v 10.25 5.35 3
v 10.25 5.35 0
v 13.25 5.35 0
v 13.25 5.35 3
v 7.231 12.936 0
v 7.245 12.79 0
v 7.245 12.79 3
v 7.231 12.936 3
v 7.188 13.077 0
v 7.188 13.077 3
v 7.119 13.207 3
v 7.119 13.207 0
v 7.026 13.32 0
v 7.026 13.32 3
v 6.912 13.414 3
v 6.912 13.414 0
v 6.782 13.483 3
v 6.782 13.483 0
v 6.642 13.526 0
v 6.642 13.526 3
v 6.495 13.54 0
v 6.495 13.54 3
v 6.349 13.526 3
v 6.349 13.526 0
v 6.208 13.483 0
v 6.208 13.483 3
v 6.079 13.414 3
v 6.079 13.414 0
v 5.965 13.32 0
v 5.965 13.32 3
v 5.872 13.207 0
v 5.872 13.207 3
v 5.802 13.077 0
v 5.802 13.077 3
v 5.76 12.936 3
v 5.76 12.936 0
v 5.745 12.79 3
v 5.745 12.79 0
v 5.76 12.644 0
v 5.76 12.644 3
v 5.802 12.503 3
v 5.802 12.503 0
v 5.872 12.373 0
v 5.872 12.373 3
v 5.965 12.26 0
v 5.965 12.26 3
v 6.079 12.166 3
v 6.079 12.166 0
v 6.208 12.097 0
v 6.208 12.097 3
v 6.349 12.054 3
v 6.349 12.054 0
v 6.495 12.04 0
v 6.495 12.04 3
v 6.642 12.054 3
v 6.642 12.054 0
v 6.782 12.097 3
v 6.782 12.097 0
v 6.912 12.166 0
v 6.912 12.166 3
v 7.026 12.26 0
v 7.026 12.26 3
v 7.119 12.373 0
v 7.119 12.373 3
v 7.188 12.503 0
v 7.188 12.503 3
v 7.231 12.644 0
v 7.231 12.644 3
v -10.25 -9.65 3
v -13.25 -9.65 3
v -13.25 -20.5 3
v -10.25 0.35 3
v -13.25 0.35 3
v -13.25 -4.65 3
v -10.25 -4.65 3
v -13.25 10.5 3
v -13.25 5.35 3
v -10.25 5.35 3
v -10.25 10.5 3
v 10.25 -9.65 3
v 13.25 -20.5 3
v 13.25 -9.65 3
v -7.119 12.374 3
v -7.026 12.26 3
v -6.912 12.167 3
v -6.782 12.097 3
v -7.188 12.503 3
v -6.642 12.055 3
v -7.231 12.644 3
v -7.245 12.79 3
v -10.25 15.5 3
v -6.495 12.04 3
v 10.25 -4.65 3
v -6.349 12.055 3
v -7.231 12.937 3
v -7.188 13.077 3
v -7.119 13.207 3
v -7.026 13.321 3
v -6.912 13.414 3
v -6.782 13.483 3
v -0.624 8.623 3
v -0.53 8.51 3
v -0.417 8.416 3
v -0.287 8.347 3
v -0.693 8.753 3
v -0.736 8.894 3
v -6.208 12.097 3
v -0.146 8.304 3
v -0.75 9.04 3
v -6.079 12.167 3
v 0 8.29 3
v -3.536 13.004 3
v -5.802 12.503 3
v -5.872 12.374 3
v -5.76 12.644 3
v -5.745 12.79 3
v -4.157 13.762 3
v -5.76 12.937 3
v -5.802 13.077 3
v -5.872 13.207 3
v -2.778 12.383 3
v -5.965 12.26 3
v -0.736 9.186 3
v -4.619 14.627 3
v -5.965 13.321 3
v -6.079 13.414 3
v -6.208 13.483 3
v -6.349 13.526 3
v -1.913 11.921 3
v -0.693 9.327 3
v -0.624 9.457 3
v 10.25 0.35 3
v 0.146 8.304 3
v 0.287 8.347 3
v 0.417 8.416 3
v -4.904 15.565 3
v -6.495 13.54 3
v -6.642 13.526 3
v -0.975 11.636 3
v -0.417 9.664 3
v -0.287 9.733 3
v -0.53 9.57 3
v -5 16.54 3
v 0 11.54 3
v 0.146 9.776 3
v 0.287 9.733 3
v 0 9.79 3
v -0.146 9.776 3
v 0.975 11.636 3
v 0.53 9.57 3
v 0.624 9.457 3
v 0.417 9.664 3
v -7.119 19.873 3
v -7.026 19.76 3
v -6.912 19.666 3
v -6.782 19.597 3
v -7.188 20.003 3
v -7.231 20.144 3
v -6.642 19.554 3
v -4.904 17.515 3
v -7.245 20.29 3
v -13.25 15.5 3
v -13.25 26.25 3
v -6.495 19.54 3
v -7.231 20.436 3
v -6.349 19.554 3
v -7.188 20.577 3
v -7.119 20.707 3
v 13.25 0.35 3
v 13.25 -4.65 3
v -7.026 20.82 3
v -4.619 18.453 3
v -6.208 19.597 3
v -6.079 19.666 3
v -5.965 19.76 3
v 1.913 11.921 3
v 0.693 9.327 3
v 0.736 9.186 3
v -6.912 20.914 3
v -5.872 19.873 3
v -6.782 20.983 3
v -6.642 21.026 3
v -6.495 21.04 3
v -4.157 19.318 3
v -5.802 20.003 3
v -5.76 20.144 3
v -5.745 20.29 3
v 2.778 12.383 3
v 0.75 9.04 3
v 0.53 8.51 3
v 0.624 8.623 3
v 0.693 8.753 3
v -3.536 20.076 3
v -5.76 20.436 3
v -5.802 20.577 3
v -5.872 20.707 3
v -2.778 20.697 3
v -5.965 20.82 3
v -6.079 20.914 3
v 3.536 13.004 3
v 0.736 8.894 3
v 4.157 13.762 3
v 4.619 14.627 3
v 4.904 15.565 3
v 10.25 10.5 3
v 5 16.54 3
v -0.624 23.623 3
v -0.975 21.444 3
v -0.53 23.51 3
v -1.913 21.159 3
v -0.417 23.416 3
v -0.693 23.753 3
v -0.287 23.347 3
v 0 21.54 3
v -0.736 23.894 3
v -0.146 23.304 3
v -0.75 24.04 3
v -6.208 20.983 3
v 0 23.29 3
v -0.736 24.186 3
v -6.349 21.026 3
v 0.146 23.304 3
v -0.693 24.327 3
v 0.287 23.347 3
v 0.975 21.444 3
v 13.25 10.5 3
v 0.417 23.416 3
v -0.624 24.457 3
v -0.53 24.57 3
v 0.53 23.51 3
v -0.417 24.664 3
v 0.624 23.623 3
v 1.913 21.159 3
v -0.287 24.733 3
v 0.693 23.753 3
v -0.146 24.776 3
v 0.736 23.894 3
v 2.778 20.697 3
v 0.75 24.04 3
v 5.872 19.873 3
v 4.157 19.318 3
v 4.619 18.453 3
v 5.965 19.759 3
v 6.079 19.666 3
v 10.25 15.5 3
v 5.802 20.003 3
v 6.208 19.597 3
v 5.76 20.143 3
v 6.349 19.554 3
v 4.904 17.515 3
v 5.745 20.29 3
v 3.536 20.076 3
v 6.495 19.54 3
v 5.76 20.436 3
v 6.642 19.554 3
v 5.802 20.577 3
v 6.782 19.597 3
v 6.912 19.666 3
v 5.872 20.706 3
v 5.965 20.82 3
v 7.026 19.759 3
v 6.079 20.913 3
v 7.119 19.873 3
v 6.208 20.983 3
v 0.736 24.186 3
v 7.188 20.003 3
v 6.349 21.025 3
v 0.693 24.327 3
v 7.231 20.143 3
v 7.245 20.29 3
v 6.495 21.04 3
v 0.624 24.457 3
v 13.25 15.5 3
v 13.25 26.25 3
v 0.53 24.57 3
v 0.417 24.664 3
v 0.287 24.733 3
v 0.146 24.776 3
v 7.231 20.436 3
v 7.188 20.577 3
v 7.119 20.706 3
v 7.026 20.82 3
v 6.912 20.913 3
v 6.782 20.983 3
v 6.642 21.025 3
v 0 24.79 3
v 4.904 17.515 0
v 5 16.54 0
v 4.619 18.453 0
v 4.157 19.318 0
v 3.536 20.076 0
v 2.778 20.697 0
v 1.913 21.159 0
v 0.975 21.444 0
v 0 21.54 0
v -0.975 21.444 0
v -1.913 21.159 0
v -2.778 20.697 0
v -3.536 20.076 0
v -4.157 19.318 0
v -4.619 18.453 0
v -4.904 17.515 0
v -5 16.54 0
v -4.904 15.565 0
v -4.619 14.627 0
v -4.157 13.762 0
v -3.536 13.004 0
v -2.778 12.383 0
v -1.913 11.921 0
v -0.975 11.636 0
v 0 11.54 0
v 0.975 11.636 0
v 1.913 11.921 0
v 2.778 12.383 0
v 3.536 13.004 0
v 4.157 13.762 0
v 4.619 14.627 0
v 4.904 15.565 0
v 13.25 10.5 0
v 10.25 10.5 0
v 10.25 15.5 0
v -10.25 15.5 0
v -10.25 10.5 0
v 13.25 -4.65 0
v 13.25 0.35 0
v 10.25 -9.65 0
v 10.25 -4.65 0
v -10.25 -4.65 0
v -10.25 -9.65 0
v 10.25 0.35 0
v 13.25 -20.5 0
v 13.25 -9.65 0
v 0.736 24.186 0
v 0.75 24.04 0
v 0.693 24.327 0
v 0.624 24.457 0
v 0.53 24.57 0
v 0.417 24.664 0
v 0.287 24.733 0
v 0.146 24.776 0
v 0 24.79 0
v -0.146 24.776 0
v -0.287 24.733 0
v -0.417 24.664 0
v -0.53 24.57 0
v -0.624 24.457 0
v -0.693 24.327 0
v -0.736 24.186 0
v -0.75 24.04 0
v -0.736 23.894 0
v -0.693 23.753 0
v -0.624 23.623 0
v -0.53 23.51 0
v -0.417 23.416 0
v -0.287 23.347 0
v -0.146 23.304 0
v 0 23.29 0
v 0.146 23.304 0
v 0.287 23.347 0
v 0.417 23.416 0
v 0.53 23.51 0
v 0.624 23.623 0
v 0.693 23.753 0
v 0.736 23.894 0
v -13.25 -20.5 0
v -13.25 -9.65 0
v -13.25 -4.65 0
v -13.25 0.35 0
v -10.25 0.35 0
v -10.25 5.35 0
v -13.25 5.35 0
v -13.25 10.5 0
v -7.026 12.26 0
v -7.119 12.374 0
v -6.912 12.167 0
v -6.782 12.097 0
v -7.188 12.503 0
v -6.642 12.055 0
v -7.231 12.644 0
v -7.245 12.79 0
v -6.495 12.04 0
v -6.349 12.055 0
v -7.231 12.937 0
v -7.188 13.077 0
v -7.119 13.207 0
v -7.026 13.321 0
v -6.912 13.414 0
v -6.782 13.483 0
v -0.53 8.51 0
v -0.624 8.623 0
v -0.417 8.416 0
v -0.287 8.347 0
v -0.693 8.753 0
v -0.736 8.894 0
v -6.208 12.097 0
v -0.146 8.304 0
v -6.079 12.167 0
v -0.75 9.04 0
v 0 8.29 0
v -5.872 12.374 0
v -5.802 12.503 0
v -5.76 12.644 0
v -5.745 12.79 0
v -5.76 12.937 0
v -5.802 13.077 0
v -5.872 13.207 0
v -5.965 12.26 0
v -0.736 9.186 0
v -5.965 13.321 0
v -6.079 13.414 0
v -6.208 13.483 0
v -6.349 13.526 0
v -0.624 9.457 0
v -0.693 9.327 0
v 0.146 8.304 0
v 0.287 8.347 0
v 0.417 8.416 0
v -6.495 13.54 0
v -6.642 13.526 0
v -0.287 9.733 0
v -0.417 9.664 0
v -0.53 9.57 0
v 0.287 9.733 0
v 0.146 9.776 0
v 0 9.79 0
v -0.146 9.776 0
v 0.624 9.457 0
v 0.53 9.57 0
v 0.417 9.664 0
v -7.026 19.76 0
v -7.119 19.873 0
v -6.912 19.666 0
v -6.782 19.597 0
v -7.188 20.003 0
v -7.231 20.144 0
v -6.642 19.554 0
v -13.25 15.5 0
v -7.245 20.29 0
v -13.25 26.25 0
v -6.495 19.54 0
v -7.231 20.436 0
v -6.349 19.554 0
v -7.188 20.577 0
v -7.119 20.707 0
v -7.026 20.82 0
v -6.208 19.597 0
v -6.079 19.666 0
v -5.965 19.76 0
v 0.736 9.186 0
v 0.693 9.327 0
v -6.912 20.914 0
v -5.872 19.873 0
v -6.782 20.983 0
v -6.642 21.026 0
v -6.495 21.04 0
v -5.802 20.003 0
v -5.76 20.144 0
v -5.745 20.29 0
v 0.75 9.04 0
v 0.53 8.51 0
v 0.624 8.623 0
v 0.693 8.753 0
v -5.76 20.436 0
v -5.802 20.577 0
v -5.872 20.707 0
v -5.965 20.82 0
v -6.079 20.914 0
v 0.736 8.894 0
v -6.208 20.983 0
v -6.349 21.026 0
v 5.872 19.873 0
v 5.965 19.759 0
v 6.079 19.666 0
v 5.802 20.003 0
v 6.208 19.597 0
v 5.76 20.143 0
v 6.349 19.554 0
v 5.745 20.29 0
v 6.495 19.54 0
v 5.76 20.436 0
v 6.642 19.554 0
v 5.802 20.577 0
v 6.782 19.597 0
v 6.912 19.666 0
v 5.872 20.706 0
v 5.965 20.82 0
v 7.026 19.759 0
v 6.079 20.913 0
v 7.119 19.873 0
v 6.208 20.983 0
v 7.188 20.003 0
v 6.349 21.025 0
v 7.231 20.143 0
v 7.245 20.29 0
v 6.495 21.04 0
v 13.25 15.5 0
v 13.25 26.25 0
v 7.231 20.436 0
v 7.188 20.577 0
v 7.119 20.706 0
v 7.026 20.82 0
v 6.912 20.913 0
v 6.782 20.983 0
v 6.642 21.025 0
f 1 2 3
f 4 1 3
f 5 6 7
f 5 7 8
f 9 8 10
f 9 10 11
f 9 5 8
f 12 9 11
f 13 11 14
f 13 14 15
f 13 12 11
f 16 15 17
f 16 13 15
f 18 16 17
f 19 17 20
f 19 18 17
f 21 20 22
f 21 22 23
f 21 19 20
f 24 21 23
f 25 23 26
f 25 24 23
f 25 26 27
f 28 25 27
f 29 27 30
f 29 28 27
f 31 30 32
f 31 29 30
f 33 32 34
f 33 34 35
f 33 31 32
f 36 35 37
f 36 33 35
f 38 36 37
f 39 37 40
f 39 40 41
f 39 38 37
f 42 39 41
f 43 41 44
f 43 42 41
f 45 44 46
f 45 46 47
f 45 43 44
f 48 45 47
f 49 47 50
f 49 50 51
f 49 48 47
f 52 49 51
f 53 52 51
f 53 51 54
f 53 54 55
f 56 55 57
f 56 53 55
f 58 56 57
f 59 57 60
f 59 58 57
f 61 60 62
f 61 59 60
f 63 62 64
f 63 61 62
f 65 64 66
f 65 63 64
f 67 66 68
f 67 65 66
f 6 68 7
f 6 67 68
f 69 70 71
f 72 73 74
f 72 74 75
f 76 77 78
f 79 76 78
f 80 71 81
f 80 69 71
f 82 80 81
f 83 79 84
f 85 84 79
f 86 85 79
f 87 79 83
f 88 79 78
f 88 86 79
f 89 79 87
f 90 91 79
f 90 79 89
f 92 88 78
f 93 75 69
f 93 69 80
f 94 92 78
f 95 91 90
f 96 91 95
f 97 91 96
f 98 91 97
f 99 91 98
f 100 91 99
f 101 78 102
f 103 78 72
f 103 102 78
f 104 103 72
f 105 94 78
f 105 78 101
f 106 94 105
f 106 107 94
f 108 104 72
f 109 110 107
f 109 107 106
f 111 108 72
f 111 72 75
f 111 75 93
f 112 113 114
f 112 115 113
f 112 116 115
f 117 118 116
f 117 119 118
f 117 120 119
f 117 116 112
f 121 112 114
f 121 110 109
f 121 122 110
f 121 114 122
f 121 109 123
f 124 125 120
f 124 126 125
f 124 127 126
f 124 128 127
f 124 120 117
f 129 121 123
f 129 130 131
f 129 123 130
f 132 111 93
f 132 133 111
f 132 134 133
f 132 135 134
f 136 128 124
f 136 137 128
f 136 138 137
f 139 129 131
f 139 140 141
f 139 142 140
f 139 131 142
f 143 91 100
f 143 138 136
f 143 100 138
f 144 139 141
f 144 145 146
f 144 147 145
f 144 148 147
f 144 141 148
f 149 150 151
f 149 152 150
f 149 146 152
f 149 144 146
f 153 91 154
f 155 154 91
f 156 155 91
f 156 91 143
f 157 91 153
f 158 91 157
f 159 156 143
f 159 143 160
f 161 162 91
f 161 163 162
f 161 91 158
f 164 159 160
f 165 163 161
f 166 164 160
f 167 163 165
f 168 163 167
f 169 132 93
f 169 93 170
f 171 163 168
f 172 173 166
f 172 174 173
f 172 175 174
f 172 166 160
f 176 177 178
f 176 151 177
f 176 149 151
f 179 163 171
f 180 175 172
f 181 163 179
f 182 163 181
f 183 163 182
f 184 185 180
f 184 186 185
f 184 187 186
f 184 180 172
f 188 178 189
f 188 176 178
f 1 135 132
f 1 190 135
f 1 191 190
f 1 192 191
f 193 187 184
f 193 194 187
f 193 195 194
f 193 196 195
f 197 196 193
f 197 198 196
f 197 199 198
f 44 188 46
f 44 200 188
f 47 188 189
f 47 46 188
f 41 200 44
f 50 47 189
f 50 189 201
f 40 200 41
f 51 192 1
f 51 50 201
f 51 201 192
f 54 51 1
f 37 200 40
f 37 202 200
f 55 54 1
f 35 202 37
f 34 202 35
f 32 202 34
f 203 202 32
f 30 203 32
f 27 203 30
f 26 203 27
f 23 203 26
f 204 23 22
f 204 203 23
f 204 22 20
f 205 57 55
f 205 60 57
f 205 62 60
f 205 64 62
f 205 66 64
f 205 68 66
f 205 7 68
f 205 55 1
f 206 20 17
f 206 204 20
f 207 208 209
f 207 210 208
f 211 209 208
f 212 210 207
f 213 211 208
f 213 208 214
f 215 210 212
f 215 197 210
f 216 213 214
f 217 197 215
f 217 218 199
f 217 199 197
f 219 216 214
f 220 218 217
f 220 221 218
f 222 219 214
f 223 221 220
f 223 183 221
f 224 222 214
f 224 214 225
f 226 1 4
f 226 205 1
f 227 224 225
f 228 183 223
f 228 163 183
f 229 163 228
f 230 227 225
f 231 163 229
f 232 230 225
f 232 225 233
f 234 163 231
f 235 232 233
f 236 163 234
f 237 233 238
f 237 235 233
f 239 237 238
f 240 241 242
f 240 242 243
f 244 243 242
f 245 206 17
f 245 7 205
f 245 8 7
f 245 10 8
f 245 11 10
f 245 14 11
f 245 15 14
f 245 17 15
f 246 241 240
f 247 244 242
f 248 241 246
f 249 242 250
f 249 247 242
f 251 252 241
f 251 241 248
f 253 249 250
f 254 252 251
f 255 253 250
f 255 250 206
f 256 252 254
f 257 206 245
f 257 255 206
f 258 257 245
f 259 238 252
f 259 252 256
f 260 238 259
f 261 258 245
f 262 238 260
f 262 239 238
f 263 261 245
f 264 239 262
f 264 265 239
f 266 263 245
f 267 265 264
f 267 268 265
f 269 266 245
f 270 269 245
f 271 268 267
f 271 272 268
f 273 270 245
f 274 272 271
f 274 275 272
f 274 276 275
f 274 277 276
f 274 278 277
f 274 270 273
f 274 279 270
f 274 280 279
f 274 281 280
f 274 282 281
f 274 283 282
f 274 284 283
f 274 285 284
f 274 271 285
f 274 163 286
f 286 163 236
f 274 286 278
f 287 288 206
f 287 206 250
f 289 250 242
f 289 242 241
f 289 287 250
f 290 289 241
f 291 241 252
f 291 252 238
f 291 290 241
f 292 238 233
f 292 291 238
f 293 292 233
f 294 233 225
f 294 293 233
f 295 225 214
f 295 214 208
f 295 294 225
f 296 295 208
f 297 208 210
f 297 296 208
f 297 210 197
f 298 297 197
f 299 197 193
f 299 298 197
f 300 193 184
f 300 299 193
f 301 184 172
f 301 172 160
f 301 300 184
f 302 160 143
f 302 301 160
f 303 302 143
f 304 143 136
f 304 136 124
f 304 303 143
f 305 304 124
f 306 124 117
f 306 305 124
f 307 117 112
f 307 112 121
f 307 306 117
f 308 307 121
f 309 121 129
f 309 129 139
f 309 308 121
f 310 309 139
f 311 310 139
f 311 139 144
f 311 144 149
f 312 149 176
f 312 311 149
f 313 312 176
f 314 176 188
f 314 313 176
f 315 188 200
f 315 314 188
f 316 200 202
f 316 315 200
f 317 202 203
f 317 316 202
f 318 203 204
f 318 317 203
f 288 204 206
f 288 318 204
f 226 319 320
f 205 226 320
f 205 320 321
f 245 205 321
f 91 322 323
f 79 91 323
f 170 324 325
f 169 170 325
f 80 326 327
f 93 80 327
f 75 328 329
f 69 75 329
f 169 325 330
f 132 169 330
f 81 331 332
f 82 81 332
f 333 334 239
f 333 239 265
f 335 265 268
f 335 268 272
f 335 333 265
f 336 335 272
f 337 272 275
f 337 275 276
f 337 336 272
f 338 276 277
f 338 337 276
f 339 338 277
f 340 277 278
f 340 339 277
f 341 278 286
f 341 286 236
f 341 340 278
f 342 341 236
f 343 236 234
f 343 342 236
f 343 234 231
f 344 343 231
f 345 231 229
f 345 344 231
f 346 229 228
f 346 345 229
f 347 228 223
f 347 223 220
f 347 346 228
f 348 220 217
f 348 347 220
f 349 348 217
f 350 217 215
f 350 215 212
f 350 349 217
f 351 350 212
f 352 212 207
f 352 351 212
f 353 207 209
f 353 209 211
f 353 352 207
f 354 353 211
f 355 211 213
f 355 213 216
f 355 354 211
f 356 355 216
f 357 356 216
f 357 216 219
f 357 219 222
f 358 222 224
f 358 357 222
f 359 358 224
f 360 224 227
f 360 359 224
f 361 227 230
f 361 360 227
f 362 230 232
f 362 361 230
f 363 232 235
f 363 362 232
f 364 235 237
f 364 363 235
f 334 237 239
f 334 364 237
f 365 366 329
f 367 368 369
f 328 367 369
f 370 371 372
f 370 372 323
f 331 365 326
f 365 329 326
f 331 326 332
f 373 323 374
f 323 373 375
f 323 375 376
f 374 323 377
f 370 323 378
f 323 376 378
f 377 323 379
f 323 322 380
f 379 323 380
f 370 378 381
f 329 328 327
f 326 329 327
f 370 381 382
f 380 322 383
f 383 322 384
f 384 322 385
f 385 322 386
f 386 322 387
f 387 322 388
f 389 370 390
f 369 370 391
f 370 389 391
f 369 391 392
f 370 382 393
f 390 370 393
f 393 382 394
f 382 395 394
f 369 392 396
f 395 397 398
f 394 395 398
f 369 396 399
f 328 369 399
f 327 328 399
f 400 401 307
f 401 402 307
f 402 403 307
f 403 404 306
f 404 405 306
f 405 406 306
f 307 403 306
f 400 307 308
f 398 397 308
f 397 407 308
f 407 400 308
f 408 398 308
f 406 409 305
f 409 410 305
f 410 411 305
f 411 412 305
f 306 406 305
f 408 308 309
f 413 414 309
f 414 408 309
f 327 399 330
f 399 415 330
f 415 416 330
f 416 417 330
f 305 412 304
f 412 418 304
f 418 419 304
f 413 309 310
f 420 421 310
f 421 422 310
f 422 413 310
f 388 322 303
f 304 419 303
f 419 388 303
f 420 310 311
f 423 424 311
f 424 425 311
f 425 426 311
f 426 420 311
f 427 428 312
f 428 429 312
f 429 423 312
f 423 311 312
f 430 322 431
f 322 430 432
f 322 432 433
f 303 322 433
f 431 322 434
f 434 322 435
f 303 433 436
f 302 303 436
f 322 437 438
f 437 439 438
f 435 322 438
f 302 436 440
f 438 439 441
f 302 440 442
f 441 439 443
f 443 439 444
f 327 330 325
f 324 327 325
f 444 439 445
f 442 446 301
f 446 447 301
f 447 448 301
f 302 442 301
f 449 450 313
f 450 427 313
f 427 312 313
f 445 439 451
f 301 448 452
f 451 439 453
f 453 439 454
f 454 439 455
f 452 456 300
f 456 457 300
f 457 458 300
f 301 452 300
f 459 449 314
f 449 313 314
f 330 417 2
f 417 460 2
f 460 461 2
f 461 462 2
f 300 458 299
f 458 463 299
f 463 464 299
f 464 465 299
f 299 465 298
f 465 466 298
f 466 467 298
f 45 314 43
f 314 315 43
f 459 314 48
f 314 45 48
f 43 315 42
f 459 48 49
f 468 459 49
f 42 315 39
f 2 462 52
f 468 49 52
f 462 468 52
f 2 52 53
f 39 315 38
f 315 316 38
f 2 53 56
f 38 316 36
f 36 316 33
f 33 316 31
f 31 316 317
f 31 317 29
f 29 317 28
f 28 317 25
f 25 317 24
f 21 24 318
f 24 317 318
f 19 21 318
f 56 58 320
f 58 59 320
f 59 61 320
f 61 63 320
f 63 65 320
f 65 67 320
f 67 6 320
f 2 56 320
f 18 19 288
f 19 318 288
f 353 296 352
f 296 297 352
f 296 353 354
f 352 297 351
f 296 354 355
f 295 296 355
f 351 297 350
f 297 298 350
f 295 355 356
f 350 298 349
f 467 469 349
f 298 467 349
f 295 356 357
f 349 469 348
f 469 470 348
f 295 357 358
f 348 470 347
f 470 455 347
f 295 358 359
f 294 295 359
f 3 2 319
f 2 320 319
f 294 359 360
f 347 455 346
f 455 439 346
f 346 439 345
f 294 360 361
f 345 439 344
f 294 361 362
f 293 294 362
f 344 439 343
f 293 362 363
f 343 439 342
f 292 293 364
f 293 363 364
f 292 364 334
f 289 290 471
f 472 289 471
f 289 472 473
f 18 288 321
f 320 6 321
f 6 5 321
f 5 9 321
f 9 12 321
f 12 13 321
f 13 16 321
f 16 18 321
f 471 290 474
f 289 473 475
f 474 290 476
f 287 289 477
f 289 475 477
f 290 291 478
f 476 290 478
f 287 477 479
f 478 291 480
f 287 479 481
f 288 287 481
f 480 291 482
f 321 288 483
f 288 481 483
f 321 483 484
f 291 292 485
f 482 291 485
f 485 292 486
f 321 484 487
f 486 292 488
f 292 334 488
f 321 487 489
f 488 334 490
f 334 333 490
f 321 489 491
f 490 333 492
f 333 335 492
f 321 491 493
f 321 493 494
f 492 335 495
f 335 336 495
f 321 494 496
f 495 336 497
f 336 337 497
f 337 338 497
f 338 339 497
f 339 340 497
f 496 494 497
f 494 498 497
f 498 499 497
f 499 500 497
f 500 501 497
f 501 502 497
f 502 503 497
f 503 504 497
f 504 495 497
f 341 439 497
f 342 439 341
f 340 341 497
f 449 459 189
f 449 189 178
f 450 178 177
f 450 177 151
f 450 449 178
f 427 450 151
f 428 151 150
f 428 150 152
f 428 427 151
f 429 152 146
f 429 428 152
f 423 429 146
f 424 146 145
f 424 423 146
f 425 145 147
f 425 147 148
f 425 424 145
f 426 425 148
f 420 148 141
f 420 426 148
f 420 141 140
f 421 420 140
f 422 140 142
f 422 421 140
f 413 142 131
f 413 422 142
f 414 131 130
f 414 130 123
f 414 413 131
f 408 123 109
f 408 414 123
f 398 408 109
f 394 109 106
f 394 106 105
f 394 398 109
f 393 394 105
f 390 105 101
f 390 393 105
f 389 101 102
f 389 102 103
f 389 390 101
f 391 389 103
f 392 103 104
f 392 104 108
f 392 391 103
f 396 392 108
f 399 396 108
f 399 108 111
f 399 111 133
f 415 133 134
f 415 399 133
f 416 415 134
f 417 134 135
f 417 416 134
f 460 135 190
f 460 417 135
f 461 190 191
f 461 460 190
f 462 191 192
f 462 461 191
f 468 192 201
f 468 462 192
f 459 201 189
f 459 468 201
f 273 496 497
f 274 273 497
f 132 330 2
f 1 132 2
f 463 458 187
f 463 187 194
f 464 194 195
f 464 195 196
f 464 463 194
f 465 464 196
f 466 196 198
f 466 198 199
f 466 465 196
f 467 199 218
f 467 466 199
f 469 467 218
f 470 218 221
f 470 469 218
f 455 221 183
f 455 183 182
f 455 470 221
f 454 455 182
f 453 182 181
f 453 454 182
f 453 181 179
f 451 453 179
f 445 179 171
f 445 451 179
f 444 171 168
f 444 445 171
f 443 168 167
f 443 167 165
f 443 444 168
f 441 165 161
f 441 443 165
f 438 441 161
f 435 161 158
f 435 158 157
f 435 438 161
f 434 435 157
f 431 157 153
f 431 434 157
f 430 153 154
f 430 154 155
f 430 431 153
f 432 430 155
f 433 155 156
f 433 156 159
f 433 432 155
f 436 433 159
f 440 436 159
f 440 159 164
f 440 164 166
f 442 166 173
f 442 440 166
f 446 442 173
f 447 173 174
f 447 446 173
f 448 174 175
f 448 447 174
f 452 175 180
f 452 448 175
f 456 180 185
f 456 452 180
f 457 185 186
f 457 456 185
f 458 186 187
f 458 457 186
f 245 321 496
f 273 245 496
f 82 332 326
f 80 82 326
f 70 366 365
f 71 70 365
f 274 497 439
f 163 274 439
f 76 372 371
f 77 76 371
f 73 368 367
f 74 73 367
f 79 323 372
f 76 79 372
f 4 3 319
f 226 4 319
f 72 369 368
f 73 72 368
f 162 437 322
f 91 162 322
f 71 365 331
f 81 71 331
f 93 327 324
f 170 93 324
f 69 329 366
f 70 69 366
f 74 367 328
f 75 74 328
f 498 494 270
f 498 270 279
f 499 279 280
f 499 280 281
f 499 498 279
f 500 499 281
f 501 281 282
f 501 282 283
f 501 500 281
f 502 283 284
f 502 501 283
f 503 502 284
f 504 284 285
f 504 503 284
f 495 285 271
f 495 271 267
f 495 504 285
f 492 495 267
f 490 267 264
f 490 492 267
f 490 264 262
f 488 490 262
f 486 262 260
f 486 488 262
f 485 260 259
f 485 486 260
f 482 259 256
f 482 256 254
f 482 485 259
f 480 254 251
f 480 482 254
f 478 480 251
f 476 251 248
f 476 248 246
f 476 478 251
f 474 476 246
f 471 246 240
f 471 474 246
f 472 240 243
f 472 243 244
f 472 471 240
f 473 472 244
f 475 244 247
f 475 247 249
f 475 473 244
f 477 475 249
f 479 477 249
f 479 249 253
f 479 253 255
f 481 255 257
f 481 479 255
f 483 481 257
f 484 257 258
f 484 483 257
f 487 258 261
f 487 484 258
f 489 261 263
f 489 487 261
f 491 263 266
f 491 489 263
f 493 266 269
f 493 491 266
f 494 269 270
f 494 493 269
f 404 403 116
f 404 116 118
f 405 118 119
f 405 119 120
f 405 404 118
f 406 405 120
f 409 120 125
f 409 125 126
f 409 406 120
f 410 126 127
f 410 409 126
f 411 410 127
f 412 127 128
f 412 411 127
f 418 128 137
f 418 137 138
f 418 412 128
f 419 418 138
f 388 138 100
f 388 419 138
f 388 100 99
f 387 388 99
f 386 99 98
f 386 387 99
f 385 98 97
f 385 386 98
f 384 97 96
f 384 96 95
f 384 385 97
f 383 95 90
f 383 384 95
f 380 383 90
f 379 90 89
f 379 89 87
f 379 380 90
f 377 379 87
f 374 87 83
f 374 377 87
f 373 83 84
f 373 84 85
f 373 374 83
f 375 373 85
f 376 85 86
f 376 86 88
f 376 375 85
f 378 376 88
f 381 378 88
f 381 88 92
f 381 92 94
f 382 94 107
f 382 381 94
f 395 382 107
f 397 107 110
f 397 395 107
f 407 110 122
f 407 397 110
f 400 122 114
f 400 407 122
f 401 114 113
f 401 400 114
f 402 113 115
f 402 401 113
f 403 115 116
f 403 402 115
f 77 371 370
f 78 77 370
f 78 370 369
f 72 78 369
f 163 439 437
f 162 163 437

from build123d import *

# Parameters (mm, degrees)
SKETCH1_R           = 5
SKETCH1_R_2         = 0.75
BOSS_EXTRUDE1_DEPTH = 3


with BuildPart() as part:
    # Sketch1 → Boss-Extrude1 (new body)
    with BuildSketch(Plane.XY):
        Polygon((-13.25, 15.5), (-10.25, 15.5), (-10.25, 10.5), (-13.25, 10.5), (-13.25, 5.35), (-10.25, 5.35), (-10.25, 0.35), (-13.25, 0.35), (-13.25, -4.65), (-10.25, -4.65), (-10.25, -9.65), (-13.25, -9.65), (-13.25, -20.5), (13.25, -20.5), (13.25, -9.65), (10.25, -9.65), (10.25, -4.65), (13.25, -4.65), (13.25, 0.35), (10.25, 0.35), (10.25, 5.35), (13.25, 5.35), (13.25, 10.5), (10.25, 10.5), (10.25, 15.5), (13.25, 15.5), (13.25, 20.5), (13.25, 26.25), (-13.25, 26.25), (-13.25, 20.5), align=None)
        with Locations((0, 16.54)):
            Circle(SKETCH1_R, mode=Mode.SUBTRACT)
        with Locations((0, 24.04)):
            Circle(SKETCH1_R_2, mode=Mode.SUBTRACT)
        with Locations((6.495302374, 20.289806272)):
            Circle(SKETCH1_R_2, mode=Mode.SUBTRACT)
        with Locations((6.495190528, 12.79)):
            Circle(SKETCH1_R_2, mode=Mode.SUBTRACT)
        with Locations((0, 9.04)):
            Circle(SKETCH1_R_2, mode=Mode.SUBTRACT)
        with Locations((-6.495302374, 12.790193728)):
            Circle(SKETCH1_R_2, mode=Mode.SUBTRACT)
        with Locations((-6.495190528, 20.29)):
            Circle(SKETCH1_R_2, mode=Mode.SUBTRACT)
    extrude(amount=BOSS_EXTRUDE1_DEPTH)


solid = part.part
